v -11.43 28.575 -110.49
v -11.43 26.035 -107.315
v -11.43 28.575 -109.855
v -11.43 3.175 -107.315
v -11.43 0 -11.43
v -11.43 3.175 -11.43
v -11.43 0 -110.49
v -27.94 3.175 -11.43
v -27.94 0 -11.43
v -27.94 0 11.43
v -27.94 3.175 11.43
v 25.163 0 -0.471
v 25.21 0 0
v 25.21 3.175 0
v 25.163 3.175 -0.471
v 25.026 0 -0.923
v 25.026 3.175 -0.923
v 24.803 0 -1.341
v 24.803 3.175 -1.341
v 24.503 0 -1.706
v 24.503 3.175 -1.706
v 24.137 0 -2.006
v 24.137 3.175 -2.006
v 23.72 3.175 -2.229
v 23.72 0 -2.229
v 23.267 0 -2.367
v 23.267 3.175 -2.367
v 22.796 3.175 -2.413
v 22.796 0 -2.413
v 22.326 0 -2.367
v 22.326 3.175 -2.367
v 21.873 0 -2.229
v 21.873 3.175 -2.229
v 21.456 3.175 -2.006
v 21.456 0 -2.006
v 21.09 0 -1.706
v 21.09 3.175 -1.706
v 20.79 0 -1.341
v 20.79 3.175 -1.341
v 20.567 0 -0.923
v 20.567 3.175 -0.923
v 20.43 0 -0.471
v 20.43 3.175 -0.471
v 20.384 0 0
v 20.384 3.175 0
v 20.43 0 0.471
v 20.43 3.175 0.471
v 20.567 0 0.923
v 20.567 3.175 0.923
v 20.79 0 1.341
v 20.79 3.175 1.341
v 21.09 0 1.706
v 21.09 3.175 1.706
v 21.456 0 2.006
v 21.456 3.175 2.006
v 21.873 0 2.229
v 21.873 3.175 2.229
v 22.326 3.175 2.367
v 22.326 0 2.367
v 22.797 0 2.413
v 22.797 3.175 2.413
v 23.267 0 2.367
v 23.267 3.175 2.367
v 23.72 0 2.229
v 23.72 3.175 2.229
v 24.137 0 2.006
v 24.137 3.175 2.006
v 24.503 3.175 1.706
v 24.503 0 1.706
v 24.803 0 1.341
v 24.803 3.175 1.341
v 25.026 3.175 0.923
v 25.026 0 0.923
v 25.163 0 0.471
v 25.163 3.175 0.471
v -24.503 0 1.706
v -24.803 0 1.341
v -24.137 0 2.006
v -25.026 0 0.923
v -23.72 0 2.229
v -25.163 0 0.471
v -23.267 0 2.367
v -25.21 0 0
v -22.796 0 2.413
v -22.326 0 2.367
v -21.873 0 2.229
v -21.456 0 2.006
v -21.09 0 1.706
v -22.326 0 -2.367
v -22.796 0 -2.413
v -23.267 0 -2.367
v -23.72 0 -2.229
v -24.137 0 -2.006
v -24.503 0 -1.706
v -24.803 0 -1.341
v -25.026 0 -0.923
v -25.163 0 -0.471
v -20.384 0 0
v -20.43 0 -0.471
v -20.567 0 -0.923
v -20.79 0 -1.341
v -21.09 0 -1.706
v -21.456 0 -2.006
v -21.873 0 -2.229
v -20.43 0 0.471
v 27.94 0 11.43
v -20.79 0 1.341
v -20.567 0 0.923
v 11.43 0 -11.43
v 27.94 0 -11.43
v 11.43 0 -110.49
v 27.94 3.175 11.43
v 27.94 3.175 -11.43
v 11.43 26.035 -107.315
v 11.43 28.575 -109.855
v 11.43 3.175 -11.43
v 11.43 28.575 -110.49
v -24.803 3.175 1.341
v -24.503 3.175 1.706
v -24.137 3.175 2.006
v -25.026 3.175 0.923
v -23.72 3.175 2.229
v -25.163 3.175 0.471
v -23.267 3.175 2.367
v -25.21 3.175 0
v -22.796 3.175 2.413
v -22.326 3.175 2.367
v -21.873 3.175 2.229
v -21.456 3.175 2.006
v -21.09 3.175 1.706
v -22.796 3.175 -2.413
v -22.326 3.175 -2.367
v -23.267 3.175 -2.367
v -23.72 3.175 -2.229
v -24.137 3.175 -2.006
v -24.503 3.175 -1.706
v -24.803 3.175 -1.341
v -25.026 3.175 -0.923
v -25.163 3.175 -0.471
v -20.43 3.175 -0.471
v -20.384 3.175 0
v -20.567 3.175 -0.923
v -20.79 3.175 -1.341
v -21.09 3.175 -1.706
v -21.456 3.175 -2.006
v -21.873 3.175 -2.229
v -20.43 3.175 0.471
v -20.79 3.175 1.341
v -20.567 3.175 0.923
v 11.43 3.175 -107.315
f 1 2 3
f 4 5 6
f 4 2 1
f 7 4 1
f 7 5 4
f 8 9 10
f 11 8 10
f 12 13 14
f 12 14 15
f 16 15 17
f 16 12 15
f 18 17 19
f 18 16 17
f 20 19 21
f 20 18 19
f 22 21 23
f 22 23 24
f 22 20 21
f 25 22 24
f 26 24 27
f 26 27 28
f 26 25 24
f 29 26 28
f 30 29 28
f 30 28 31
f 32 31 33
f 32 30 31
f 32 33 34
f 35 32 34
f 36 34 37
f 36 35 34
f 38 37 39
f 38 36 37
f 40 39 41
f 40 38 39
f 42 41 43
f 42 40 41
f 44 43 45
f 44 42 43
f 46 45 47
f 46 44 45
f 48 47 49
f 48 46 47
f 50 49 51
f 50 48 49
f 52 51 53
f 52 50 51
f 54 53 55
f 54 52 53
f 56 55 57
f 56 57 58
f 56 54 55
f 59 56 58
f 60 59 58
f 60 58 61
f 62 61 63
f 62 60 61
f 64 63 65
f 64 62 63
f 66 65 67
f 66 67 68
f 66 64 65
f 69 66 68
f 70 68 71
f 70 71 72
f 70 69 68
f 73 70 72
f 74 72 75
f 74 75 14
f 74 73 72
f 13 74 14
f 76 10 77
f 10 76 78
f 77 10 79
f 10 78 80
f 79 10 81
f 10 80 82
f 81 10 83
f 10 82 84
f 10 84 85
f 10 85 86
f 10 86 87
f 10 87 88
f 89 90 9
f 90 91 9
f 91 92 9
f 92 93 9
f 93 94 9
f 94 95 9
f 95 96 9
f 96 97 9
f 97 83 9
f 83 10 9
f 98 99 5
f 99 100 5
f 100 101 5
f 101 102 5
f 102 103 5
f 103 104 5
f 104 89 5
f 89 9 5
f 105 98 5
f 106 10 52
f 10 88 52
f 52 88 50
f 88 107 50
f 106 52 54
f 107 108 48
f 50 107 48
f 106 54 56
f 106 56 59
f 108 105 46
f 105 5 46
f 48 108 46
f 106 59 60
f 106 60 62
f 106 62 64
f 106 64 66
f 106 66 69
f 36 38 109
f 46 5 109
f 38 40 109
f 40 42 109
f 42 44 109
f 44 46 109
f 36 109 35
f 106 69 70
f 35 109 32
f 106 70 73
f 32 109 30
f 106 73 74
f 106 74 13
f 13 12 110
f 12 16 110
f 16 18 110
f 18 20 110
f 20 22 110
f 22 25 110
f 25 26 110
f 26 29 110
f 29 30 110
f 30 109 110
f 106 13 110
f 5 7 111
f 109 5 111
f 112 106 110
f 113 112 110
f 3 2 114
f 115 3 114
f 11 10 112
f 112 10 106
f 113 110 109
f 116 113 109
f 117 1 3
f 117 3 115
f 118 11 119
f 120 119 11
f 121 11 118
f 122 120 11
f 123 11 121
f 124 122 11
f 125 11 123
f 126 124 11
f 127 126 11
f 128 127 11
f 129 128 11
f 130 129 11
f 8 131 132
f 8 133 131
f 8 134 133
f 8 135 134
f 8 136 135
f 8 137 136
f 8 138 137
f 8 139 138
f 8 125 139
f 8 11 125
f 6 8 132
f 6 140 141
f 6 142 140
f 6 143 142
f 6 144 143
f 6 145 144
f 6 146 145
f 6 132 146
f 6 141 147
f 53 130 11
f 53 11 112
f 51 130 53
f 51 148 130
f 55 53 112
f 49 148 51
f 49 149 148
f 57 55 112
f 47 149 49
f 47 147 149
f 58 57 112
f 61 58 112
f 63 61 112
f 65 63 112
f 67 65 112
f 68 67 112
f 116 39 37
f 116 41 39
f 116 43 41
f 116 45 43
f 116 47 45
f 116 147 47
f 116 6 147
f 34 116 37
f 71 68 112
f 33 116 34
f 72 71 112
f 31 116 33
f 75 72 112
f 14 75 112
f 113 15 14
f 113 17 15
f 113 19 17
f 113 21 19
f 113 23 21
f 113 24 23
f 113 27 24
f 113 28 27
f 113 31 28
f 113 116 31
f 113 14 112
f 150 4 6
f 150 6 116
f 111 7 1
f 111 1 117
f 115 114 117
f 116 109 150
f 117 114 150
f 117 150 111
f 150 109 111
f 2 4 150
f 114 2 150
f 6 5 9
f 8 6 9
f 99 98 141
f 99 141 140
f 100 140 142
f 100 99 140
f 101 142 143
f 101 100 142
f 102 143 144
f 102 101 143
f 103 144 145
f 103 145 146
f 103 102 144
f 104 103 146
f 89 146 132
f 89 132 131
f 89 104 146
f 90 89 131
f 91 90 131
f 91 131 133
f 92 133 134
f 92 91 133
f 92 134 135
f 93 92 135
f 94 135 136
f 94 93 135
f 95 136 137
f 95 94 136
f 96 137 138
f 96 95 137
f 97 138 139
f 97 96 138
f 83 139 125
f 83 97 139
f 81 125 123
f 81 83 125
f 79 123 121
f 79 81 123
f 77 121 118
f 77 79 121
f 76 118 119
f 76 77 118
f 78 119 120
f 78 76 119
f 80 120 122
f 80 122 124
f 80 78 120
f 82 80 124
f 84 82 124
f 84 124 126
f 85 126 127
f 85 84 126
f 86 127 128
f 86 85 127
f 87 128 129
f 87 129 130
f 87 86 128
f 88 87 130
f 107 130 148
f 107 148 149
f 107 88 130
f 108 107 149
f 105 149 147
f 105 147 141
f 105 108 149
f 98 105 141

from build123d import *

# Parameters (mm, degrees)
SKETCH1_R           = 2.413
BOSS_EXTRUDE1_DEPTH = 3.175
SKETCH2_W           = 22.86
SKETCH2_H           = 3.175
BOSS_EXTRUDE2_DEPTH = 25.4
CHAMFER1_SIZE       = 2.54


with BuildPart() as part:
    # Sketch1 → Boss-Extrude1 (new body)
    with BuildSketch(Plane(origin=(0, 0, 0), x_dir=(1, 0, 0), z_dir=(0, 1, 0))):
        Polygon((-27.94, -11.43), (27.94, -11.43), (27.94, 11.43), (11.43, 11.43), (11.43, 110.49), (-11.43, 110.49), (-11.43, 11.43), (-27.94, 11.43), align=None)
        with Locations((-22.7965, 0)):
            Circle(SKETCH1_R, mode=Mode.SUBTRACT)
        with Locations((22.7965, 0)):
            Circle(SKETCH1_R, mode=Mode.SUBTRACT)
    extrude(amount=BOSS_EXTRUDE1_DEPTH)

    # Sketch2 → Boss-Extrude2 (add)
    with BuildSketch(Plane(origin=(0, 3.175, 0), x_dir=(1, 0, 0), z_dir=(0, 1, 0))):
        with Locations((0, 108.9025)):
            Rectangle(SKETCH2_W, SKETCH2_H)
    extrude(amount=BOSS_EXTRUDE2_DEPTH)

    # Chamfer1
    chamfer1_edges = [part.edges().sort_by_distance(p)[0] for p in [
        (0, 28.575, -107.315),
    ]]
    chamfer(chamfer1_edges, length=CHAMFER1_SIZE)


solid = part.part
